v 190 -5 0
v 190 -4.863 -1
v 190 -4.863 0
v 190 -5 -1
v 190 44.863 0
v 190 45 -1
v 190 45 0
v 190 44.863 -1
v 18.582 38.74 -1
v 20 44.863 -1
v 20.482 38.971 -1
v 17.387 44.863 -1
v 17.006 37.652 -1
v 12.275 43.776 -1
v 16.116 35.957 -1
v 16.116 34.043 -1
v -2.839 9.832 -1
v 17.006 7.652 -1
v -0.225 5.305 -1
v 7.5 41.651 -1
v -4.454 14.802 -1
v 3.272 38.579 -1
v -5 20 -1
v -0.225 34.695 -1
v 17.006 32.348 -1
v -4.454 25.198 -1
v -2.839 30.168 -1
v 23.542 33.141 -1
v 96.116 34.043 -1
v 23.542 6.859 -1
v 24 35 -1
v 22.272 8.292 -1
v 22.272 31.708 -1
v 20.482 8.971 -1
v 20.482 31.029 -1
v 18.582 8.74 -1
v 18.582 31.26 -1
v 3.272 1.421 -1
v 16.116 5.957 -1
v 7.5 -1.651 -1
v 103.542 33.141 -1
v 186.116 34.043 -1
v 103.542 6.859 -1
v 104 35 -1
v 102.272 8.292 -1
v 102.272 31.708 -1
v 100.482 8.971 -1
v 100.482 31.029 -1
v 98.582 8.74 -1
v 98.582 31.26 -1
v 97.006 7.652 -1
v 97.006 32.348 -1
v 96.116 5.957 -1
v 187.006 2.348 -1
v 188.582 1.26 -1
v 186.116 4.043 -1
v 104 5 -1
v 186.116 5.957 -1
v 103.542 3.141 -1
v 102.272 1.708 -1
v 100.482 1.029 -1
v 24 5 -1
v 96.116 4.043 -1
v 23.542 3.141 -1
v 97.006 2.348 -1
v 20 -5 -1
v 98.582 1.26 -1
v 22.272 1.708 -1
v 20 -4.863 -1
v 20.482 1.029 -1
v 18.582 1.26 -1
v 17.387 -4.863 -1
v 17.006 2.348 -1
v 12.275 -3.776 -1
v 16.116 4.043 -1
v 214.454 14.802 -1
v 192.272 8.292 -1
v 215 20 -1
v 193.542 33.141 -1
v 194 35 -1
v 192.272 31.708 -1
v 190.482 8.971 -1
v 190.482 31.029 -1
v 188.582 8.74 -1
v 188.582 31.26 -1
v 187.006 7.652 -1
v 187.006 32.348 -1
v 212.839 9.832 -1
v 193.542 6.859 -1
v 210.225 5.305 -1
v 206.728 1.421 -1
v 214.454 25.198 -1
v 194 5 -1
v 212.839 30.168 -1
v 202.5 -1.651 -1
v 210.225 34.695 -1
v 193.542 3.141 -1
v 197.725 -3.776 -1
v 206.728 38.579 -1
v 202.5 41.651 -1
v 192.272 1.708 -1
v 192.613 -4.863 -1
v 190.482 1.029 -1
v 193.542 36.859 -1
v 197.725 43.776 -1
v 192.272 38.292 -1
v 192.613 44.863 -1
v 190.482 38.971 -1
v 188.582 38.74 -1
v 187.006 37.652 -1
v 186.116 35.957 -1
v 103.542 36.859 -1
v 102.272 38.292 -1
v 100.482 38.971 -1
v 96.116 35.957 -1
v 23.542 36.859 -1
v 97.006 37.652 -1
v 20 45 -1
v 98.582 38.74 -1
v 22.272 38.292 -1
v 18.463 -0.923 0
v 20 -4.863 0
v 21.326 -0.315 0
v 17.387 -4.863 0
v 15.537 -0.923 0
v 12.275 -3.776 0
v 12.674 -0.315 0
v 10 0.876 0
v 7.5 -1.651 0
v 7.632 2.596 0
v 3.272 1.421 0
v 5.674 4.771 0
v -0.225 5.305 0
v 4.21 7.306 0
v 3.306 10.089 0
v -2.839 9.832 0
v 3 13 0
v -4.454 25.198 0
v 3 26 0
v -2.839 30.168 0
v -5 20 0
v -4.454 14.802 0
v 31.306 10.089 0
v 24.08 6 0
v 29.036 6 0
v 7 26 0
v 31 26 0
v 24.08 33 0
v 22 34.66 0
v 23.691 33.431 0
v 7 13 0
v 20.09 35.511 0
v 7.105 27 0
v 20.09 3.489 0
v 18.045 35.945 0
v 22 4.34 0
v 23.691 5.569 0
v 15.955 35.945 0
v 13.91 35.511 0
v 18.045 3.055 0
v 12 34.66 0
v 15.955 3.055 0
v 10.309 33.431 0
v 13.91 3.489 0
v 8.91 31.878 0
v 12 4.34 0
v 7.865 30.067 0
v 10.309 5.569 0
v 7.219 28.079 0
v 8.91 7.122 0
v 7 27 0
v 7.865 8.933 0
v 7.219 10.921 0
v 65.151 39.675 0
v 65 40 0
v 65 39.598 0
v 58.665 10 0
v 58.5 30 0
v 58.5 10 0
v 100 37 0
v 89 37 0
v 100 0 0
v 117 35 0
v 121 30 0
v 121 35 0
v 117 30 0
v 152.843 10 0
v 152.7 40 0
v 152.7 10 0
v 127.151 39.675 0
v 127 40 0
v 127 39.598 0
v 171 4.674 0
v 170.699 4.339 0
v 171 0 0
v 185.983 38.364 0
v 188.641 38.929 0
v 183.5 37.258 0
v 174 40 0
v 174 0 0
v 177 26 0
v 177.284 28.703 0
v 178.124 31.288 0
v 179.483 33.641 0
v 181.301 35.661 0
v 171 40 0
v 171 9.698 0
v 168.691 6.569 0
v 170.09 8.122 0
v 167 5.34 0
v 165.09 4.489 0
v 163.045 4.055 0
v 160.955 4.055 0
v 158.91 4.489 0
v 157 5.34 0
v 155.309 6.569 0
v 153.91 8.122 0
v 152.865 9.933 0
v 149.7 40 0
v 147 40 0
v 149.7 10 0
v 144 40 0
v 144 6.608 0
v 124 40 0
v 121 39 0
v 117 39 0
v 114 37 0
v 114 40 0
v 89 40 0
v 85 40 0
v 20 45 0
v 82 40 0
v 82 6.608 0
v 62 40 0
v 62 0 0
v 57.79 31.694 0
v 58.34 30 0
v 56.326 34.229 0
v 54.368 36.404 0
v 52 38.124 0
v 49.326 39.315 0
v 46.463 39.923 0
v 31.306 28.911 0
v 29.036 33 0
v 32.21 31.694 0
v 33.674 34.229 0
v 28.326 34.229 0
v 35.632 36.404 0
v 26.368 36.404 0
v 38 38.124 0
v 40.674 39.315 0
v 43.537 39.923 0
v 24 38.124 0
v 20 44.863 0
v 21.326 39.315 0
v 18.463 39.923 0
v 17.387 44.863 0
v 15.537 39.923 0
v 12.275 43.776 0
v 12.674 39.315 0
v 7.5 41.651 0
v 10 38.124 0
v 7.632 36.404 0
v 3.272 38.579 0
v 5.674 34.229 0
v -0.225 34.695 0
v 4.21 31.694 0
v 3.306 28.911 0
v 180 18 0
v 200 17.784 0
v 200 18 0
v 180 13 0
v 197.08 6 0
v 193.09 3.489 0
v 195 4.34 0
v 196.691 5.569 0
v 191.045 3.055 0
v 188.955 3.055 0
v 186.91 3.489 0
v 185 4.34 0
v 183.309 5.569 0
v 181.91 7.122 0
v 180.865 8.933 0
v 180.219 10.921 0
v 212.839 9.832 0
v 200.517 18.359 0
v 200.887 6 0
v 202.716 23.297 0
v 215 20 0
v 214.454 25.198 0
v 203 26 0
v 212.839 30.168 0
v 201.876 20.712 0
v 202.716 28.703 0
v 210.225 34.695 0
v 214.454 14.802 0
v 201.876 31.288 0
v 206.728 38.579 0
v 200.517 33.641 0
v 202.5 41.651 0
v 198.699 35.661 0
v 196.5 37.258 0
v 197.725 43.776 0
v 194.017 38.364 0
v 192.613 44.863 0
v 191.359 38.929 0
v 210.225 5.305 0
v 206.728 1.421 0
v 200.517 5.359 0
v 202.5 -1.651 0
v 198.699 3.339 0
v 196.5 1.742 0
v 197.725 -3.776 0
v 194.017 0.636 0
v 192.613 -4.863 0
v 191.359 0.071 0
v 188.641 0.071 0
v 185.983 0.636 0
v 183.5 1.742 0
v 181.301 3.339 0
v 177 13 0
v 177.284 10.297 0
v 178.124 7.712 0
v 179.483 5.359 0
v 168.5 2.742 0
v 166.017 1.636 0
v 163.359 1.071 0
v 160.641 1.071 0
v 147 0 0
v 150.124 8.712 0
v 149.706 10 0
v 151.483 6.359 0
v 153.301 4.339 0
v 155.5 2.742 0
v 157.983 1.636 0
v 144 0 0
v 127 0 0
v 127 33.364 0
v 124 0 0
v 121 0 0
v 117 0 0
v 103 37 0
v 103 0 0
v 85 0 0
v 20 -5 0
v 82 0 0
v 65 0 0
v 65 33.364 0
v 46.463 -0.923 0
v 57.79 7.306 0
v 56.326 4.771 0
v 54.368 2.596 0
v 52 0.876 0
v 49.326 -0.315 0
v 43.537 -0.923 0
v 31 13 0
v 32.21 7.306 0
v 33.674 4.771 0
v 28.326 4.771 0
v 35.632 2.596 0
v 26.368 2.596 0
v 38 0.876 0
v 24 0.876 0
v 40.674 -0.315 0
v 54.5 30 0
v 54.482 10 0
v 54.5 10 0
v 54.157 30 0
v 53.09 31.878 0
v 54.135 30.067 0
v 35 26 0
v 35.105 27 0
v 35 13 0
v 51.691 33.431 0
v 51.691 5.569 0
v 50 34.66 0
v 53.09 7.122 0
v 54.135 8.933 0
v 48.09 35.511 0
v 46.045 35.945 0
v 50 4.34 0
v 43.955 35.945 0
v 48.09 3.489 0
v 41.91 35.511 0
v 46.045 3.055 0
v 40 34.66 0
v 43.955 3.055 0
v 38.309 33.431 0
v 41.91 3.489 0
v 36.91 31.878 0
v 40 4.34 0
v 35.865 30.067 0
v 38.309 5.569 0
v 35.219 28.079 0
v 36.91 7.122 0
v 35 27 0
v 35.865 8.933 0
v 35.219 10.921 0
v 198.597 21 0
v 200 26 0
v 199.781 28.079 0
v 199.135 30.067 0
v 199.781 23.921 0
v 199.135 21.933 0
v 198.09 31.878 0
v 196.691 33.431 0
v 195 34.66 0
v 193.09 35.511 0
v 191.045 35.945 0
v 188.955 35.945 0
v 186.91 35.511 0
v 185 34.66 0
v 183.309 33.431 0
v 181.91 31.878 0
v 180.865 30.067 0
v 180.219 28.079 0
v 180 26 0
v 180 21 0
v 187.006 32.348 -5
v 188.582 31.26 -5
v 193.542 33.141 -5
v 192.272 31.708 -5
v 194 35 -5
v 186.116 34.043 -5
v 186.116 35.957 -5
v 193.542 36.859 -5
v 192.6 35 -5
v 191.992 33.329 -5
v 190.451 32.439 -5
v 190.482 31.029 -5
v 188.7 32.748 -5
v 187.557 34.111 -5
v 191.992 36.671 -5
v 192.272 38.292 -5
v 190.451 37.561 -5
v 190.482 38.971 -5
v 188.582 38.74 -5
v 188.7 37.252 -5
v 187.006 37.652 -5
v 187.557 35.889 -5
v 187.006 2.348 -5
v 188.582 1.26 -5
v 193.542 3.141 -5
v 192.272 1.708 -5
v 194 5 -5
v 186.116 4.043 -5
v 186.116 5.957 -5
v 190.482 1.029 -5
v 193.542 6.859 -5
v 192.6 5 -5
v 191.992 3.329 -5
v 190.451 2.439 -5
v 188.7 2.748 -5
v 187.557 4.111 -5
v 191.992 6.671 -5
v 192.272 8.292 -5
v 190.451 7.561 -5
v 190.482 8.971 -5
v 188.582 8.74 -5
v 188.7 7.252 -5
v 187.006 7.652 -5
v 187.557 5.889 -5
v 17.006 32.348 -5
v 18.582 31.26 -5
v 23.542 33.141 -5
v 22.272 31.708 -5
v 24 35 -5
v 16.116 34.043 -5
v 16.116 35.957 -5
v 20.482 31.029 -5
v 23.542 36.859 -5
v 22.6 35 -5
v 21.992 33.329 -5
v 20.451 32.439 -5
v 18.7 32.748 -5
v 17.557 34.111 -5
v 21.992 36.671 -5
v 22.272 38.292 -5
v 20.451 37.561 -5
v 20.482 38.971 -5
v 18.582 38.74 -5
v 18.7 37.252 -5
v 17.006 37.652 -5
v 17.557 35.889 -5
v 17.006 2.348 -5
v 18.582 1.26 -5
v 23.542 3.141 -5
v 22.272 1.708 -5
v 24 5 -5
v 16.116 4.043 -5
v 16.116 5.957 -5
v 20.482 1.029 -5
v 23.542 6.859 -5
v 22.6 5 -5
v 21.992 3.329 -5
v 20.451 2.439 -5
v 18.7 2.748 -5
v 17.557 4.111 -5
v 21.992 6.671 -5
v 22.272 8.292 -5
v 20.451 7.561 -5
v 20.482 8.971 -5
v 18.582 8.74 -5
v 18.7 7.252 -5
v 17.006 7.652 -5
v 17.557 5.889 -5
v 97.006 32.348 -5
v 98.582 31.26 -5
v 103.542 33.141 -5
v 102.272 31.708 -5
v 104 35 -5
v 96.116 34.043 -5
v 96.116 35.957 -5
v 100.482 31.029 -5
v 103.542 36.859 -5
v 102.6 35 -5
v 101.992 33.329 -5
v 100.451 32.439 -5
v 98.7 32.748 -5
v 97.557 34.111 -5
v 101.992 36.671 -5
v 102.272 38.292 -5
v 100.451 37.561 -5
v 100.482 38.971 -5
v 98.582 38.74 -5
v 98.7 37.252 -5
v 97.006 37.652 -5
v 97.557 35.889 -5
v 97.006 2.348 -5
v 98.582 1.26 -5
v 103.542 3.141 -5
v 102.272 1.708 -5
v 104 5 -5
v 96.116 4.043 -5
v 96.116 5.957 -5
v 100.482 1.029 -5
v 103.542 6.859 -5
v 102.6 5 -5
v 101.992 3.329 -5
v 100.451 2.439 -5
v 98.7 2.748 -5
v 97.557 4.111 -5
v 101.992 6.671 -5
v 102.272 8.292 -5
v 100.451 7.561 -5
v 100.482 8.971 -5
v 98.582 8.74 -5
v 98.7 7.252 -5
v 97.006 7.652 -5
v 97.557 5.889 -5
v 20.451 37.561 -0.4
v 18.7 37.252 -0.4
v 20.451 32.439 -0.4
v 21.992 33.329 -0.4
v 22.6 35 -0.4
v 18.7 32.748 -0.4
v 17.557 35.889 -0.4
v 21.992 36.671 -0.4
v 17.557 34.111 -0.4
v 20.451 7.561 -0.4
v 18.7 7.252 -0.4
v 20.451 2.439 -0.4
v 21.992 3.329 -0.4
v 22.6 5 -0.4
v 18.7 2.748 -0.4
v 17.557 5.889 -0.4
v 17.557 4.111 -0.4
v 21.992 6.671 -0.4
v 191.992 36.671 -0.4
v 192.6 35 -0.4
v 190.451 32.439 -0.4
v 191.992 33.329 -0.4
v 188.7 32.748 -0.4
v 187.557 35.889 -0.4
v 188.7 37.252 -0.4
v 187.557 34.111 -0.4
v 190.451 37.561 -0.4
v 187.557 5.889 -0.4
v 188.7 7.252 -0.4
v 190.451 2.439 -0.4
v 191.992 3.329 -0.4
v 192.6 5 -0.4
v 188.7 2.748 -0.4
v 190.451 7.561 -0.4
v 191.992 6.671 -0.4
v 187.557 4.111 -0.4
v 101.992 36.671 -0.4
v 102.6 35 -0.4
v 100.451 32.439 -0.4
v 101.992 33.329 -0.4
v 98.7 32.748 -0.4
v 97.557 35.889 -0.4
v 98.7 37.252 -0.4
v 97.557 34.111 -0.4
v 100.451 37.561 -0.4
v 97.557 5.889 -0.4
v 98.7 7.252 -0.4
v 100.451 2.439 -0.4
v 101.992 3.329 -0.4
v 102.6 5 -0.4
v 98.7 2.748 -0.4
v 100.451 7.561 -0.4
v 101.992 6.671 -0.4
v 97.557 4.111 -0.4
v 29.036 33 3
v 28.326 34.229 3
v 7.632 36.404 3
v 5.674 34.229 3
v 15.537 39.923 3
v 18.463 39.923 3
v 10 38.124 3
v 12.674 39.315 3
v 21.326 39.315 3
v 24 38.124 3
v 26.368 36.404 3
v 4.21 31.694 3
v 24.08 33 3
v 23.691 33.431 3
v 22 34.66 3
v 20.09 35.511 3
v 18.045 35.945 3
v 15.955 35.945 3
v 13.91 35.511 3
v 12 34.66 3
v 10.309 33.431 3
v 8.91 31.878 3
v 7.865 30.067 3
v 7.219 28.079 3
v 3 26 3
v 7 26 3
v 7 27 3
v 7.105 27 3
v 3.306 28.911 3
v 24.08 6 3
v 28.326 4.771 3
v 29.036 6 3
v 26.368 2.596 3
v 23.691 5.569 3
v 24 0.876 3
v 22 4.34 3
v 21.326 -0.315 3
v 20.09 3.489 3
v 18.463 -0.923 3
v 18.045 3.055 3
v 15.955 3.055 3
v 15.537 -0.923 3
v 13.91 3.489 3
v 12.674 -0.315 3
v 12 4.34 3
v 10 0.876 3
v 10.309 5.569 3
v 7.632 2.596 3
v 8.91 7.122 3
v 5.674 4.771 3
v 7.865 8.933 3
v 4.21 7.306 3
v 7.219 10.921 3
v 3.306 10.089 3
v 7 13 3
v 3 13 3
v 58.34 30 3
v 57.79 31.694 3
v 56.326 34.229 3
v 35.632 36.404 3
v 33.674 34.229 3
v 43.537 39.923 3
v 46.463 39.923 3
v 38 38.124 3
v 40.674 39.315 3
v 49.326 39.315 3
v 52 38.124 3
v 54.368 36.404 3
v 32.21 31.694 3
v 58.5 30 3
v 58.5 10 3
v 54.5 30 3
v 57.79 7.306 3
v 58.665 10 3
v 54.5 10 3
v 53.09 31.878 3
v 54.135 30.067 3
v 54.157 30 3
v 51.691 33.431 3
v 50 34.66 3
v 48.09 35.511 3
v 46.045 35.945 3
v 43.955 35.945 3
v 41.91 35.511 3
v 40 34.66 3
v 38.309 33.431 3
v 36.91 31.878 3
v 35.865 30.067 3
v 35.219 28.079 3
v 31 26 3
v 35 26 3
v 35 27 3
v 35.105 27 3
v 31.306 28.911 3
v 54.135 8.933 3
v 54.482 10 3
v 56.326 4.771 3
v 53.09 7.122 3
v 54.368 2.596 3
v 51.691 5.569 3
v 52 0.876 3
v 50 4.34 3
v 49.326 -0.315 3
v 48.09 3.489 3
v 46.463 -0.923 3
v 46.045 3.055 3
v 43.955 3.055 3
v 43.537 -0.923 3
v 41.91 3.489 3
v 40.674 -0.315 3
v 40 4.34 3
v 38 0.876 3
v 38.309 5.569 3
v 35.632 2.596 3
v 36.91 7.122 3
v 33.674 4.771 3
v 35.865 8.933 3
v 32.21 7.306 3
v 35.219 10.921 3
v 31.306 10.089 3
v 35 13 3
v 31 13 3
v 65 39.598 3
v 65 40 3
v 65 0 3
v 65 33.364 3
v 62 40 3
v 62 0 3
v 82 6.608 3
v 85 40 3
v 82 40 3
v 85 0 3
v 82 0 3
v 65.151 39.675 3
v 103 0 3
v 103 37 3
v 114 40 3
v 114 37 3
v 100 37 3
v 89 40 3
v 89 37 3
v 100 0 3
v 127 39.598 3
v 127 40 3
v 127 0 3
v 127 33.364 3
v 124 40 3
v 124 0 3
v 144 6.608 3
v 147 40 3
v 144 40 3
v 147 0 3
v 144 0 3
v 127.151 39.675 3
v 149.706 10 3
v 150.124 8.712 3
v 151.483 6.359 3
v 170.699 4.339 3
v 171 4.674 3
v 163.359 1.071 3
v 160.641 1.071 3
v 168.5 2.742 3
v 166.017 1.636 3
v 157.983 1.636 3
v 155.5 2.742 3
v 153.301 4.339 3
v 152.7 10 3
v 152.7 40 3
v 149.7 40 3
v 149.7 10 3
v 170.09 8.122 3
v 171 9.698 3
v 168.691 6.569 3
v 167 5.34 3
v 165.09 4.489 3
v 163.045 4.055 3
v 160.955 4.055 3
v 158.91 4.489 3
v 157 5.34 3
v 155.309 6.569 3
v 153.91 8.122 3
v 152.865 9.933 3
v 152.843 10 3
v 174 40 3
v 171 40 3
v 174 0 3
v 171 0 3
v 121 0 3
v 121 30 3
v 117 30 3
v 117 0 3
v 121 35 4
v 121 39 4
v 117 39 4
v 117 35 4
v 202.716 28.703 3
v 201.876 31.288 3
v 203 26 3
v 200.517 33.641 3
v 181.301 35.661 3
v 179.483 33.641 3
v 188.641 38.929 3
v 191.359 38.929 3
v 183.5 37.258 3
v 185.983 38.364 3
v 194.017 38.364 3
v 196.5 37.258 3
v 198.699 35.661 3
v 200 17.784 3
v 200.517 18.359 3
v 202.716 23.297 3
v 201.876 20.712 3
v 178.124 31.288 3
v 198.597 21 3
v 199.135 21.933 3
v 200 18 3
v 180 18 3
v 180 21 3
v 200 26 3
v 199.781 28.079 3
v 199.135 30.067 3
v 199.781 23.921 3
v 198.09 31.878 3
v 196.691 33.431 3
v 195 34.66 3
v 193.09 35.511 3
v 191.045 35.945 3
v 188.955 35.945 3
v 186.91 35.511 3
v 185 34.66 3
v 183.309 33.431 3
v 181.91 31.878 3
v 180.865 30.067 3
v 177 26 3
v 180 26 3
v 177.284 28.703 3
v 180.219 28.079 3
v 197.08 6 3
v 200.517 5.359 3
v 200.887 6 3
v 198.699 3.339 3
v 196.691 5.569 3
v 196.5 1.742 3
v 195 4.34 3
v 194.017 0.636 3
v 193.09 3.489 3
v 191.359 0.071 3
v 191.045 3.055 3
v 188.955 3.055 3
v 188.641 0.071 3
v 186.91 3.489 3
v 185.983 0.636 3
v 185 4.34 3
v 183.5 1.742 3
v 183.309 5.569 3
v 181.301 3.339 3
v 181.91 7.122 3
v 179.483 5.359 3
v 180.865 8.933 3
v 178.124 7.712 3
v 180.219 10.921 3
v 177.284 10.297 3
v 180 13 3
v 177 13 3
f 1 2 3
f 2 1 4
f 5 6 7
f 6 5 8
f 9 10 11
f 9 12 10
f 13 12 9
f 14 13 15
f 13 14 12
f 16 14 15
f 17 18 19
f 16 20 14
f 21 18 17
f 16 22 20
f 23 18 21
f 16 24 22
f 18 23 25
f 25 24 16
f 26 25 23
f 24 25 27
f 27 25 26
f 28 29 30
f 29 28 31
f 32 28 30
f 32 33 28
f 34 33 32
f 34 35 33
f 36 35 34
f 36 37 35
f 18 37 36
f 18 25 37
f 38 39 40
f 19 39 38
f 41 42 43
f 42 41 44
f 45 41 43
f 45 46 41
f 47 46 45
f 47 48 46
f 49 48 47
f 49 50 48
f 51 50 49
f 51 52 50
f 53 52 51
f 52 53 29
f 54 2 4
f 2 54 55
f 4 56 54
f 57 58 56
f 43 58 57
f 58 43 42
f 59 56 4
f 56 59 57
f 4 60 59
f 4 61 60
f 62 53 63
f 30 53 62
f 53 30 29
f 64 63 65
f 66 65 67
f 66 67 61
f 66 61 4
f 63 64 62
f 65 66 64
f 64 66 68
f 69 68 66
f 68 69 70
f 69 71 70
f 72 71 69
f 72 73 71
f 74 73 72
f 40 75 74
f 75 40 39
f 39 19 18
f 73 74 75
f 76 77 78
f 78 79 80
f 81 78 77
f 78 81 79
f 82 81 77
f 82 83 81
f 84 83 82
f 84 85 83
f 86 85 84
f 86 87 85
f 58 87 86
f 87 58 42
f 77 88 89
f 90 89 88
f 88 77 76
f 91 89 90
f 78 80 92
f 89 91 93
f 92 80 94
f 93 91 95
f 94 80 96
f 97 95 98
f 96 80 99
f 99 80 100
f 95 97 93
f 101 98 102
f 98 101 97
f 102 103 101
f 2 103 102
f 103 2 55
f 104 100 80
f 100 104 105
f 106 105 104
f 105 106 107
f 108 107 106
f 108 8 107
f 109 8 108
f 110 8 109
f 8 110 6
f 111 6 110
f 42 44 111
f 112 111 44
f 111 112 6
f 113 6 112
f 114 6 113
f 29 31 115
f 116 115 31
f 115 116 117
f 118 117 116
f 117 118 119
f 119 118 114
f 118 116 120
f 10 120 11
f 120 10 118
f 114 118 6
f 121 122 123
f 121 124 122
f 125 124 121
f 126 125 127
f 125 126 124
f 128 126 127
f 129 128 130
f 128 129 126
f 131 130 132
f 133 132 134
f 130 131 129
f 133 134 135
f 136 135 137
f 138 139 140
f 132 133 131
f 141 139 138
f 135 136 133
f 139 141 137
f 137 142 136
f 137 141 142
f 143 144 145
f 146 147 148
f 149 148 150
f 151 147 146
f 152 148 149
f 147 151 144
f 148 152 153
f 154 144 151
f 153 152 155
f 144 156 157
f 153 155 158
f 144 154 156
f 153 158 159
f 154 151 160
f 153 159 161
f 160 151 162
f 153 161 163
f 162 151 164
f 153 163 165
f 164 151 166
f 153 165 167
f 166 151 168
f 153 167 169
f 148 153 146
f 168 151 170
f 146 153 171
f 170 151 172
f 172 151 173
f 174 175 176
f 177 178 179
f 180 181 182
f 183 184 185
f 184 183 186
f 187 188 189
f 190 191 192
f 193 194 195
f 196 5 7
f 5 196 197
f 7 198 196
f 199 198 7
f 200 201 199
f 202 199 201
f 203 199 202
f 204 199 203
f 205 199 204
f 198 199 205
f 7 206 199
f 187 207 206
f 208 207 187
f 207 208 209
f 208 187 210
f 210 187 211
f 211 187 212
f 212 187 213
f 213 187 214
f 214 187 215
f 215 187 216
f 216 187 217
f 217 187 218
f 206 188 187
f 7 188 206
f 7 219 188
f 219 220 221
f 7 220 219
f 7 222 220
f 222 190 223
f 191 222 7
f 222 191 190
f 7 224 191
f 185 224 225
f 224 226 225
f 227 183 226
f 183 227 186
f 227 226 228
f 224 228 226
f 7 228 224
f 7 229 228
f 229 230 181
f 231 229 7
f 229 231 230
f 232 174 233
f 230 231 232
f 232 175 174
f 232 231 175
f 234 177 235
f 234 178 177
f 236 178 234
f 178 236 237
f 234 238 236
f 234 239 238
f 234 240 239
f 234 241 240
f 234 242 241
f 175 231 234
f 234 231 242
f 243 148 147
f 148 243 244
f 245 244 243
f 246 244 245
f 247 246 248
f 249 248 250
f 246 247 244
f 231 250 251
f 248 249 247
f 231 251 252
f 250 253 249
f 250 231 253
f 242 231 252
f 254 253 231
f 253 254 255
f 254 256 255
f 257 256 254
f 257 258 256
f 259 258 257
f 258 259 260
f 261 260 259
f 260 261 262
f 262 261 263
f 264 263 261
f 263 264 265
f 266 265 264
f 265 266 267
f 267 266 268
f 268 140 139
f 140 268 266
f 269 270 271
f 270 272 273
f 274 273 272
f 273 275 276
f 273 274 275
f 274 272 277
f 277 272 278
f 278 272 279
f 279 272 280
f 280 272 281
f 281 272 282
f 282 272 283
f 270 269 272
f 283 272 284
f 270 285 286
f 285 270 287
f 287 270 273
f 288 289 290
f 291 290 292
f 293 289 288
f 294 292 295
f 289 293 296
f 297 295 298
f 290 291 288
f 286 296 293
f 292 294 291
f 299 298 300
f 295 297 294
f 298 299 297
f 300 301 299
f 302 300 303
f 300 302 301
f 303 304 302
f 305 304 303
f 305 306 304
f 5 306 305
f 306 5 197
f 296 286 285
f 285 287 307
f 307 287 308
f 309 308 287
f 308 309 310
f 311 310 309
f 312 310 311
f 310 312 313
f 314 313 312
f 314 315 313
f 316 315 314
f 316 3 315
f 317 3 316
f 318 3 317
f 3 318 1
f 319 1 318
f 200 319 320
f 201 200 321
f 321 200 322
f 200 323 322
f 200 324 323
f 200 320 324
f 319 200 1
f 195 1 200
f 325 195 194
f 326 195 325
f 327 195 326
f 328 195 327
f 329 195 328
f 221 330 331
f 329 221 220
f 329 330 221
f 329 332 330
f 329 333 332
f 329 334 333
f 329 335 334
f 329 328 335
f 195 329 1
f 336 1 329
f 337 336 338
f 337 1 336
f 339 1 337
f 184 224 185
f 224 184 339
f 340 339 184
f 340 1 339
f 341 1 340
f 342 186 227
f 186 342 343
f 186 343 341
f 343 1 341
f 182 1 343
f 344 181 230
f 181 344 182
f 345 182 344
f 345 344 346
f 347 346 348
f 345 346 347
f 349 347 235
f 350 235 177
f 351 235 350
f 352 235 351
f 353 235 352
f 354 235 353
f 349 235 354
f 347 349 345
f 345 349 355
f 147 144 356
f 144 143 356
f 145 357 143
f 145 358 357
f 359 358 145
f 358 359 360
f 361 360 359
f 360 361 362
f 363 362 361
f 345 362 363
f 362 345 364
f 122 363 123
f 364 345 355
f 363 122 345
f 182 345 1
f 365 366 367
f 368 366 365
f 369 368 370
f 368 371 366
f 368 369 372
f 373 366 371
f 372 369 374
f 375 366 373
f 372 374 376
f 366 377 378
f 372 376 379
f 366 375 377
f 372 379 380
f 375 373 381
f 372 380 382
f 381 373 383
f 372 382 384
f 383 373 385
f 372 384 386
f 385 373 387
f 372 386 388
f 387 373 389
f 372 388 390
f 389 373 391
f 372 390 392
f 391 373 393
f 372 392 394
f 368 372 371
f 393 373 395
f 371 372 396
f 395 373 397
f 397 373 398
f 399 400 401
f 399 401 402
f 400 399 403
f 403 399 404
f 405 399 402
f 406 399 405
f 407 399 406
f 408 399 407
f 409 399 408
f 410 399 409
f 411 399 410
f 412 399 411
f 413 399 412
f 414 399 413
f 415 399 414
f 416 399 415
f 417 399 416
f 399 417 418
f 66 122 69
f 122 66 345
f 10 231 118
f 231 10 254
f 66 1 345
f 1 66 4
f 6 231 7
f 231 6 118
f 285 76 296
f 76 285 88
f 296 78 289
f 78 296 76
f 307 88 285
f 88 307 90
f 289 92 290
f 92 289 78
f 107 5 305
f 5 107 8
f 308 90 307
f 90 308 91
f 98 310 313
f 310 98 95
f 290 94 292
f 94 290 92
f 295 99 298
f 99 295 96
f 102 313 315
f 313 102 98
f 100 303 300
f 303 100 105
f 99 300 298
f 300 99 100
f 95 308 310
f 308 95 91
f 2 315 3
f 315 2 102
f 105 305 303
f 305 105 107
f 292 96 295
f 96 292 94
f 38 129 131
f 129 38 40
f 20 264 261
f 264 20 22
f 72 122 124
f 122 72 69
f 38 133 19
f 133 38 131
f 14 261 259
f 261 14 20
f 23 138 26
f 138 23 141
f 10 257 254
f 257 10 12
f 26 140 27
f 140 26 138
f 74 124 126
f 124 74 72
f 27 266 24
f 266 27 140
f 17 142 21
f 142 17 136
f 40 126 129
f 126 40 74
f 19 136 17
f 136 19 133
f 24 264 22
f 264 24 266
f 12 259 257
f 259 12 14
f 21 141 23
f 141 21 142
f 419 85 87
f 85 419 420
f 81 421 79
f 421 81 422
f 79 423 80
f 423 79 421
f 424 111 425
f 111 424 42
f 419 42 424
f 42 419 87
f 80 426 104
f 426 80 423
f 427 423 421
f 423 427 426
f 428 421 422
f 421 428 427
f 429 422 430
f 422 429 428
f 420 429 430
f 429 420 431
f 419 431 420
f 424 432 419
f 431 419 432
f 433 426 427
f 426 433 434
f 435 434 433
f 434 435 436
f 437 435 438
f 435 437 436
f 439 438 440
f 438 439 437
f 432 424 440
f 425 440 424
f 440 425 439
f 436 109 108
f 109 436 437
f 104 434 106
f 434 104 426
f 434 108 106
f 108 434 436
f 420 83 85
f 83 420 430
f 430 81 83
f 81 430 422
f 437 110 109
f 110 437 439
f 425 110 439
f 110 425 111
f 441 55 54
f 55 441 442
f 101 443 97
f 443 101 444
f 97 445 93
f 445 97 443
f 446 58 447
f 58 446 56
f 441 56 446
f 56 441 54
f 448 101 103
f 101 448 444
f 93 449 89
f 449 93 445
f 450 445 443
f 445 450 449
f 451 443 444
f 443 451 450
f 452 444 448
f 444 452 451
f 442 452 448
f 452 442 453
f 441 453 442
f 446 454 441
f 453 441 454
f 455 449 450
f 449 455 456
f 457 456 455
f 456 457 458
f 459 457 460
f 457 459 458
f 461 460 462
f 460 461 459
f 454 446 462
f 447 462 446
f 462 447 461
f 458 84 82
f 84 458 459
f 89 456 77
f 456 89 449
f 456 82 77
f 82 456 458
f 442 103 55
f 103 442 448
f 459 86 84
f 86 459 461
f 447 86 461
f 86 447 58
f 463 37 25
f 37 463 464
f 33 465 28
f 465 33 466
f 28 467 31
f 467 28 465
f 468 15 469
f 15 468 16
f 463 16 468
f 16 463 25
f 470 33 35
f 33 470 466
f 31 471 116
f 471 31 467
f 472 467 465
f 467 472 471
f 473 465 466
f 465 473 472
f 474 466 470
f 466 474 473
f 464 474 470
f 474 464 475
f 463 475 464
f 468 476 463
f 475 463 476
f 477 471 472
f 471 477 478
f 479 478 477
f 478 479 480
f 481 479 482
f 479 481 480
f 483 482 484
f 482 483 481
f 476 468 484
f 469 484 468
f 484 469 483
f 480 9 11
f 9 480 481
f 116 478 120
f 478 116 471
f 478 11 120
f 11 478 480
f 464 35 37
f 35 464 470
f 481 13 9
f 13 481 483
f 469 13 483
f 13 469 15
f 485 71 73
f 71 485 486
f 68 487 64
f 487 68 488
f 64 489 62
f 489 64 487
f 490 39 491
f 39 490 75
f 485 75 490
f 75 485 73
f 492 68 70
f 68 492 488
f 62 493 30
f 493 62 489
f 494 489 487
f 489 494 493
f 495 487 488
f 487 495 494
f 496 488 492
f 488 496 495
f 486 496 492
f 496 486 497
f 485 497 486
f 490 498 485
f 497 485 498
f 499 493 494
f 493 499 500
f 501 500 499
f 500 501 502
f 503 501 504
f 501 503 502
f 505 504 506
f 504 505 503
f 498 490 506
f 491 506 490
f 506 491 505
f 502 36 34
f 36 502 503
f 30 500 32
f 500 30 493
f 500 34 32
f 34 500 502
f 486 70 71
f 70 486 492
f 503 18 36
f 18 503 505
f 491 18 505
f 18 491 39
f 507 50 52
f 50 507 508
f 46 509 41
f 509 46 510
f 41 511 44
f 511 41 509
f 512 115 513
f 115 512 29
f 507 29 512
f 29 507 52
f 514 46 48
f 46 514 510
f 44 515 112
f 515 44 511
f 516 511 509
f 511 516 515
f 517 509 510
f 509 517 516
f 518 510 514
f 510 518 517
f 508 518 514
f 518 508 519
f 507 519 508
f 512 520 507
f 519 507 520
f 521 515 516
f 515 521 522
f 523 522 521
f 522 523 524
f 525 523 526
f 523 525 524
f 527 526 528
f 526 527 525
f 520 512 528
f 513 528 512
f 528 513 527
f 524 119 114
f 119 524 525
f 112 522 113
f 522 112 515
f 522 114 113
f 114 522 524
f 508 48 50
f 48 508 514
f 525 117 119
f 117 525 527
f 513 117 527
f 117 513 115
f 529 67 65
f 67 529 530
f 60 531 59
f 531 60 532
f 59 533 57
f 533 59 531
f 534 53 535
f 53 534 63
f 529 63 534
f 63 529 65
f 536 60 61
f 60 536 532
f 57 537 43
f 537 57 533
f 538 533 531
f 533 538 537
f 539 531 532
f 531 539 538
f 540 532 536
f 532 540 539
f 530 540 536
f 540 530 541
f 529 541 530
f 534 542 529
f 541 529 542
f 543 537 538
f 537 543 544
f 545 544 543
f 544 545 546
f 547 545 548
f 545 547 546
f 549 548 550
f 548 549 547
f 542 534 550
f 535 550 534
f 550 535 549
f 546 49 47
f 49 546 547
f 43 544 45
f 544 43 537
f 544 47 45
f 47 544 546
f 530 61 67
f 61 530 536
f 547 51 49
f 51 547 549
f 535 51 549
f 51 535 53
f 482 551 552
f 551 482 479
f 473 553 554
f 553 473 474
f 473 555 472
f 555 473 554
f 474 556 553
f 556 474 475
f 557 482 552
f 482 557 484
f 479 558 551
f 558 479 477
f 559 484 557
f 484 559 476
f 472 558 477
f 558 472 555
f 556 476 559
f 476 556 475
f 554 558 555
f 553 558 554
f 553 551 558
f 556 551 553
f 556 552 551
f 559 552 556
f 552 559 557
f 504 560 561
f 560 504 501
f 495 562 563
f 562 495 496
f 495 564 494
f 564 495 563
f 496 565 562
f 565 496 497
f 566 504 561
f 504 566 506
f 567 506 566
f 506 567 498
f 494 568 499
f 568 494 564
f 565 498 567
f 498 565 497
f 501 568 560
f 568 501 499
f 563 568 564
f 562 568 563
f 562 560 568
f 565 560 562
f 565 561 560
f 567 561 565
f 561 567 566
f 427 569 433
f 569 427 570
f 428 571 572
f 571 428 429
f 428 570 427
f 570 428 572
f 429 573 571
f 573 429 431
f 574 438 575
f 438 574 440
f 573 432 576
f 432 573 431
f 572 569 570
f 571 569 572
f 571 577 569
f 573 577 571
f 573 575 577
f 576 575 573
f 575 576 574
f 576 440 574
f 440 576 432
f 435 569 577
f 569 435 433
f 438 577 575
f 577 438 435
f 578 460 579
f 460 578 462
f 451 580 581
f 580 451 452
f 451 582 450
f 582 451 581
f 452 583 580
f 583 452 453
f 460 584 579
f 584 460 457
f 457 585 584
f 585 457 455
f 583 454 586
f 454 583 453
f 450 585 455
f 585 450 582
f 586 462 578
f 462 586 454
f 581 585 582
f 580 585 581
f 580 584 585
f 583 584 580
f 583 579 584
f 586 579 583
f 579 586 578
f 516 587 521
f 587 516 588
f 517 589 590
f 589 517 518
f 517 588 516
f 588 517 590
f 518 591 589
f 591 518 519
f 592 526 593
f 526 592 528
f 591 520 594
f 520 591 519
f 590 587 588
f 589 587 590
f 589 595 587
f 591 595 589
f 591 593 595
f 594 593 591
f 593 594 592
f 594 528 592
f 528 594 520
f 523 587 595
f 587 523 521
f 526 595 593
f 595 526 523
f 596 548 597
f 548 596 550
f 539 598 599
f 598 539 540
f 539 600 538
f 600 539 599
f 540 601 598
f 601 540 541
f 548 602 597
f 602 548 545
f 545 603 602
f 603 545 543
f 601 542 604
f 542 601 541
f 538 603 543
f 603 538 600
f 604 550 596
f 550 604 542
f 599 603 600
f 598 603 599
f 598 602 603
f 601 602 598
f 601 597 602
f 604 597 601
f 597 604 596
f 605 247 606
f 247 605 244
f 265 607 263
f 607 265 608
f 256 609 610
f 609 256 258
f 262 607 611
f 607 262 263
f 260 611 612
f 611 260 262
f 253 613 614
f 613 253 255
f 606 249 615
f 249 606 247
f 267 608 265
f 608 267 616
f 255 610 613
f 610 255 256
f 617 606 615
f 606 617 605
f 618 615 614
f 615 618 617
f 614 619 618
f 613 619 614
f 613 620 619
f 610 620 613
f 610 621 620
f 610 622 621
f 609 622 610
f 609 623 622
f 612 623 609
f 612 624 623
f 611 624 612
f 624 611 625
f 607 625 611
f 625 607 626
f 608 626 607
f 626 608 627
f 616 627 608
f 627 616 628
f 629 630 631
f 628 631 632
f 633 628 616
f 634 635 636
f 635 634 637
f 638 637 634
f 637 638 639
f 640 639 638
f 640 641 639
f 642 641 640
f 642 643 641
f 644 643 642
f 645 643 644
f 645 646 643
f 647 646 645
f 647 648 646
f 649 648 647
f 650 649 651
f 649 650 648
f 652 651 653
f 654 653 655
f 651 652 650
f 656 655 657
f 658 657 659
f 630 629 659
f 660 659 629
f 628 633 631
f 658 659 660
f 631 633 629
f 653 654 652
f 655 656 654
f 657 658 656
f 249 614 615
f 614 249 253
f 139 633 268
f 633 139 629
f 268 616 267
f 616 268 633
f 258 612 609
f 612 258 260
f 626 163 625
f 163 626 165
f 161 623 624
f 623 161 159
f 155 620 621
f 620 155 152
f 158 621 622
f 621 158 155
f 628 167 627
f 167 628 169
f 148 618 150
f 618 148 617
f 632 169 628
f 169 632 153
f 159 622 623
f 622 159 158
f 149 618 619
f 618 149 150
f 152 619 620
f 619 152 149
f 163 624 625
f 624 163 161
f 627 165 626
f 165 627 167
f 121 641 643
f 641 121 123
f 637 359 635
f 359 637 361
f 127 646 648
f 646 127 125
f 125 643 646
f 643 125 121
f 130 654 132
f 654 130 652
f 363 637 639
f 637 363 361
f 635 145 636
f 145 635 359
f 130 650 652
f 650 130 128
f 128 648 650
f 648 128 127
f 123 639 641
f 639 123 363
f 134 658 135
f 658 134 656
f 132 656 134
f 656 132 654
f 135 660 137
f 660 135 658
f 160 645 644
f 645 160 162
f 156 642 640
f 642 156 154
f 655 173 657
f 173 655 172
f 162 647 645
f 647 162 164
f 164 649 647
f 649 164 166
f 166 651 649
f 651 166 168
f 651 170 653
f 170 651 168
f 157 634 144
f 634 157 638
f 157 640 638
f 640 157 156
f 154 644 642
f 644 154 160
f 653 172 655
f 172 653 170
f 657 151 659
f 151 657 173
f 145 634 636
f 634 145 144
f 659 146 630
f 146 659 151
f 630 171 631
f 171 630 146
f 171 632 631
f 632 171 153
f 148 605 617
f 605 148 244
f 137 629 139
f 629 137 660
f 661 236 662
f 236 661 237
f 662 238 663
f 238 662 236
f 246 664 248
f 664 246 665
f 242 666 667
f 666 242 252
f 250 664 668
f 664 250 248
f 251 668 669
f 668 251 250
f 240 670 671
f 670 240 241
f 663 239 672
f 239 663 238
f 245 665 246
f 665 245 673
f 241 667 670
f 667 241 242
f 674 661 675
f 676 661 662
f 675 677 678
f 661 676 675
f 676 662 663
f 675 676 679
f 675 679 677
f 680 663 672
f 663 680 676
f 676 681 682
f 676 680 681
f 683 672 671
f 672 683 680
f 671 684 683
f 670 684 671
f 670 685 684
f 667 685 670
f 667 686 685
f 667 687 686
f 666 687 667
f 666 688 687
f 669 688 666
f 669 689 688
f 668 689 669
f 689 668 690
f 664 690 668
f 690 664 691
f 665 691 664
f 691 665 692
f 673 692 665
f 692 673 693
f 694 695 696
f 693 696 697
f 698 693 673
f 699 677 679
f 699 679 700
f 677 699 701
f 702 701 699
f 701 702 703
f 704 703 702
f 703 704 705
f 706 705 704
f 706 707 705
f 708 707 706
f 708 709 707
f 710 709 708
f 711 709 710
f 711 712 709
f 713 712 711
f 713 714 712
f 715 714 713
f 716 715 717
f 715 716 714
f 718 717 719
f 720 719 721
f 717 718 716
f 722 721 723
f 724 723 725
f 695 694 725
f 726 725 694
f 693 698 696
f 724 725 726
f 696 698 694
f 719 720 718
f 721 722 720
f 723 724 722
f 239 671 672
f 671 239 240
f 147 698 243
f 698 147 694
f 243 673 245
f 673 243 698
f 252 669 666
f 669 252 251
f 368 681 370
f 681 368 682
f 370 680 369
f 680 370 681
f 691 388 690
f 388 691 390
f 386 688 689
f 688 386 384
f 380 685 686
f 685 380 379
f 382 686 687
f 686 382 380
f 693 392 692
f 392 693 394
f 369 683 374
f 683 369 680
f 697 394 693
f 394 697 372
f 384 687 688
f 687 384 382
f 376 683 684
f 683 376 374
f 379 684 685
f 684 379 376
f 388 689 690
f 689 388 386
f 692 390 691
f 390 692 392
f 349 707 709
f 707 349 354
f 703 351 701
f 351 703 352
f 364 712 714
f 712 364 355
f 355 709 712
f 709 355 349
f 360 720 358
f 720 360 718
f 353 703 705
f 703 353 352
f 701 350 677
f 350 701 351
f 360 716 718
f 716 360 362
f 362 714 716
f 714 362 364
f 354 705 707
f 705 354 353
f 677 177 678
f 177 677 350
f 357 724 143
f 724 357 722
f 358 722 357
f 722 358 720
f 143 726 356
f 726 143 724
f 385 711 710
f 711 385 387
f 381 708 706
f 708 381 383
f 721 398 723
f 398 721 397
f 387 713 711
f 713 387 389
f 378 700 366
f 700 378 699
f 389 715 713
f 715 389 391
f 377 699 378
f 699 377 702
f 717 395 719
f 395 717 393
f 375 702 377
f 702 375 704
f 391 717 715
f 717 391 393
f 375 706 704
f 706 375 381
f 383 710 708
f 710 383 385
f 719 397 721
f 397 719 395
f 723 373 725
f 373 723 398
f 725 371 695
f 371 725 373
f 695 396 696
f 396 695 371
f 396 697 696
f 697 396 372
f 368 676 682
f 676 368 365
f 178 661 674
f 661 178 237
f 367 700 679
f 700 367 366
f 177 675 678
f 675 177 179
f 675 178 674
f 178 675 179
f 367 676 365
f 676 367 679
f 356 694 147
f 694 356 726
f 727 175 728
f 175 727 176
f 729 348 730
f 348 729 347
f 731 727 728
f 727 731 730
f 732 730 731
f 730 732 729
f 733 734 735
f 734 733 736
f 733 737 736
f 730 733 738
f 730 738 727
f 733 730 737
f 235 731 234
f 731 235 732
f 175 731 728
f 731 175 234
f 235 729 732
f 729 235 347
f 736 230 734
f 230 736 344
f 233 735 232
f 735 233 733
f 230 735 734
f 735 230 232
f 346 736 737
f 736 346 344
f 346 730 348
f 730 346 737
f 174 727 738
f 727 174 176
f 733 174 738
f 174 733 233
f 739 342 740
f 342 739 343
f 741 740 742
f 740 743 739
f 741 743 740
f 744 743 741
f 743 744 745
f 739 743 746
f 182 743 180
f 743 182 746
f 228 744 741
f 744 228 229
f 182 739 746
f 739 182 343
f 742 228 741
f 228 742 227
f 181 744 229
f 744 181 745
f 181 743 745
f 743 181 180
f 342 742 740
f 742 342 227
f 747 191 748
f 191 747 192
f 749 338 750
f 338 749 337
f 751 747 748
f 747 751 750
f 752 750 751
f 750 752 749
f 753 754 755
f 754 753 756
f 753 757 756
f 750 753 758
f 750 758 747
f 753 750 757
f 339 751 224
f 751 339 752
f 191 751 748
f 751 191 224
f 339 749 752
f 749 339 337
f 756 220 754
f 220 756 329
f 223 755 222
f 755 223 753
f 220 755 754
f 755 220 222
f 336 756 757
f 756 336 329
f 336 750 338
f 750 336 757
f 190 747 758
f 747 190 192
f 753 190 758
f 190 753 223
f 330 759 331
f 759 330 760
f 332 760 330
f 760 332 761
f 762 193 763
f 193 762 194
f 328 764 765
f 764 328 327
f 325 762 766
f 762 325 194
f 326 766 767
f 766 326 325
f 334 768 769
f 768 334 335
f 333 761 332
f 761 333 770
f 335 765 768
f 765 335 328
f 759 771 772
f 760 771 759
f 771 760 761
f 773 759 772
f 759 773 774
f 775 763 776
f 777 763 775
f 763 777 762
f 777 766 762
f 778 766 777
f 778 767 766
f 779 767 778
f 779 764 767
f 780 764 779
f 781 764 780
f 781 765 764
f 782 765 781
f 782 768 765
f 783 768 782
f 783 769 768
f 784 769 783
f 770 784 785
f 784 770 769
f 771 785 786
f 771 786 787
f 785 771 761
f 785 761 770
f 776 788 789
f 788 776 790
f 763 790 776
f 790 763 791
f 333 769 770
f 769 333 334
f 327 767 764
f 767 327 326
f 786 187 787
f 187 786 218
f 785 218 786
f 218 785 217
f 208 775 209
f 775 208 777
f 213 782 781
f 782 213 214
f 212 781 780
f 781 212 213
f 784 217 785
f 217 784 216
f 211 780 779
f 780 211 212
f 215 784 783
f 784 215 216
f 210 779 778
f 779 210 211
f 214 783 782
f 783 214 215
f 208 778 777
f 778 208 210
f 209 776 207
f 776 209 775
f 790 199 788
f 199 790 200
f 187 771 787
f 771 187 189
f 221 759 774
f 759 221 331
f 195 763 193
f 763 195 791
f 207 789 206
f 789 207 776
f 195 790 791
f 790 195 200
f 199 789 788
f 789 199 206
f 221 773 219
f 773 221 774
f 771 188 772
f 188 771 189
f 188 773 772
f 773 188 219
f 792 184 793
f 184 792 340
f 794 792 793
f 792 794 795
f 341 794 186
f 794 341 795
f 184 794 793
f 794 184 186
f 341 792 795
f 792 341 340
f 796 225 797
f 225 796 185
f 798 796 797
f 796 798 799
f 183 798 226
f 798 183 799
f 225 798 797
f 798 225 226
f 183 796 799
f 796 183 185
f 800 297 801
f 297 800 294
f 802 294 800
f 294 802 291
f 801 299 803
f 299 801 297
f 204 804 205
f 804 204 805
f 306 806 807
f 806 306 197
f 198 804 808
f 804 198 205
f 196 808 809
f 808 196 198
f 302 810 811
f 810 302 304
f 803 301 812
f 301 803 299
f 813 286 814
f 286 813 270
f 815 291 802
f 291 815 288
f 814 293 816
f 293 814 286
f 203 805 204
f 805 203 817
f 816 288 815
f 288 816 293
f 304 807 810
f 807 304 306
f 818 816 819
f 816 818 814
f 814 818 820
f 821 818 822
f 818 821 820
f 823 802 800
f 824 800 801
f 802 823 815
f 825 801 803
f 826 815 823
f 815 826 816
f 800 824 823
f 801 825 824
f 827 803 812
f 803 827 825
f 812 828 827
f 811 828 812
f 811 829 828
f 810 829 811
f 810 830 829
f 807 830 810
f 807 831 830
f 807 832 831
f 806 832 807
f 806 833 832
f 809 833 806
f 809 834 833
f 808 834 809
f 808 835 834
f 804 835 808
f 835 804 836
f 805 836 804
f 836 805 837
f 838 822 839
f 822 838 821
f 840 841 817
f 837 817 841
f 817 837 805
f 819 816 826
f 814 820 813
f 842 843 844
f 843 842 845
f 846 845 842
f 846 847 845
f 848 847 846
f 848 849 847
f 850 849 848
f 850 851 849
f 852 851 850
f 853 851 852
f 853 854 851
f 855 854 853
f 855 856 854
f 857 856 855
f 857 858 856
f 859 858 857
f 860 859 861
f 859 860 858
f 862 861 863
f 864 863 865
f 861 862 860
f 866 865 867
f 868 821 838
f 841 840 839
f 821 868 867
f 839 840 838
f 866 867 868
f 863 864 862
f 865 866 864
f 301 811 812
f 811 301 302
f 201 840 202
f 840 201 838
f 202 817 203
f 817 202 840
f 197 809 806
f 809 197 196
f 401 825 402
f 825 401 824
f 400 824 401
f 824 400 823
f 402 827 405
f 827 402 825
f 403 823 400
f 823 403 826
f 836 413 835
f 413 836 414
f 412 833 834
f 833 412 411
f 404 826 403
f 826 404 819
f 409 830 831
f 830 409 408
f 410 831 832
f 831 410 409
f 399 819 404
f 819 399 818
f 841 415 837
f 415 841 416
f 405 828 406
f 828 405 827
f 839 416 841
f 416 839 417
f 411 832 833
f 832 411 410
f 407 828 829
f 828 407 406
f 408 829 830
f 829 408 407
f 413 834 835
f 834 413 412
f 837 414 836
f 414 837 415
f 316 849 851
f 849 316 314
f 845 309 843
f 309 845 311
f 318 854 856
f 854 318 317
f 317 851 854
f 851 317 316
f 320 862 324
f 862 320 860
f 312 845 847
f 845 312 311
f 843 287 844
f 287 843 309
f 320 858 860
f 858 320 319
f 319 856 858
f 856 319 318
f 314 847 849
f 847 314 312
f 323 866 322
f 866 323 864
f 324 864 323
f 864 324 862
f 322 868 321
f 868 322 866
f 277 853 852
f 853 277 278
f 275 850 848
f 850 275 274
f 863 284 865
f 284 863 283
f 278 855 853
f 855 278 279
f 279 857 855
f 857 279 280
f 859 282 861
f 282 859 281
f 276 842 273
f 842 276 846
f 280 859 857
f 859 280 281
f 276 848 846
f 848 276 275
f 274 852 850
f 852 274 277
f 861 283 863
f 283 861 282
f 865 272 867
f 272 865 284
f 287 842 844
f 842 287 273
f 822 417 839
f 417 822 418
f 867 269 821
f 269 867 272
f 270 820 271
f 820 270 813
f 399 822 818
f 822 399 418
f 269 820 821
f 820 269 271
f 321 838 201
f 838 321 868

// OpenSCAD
//основа						
 union(){
	rotate([180,0,0]) translate([20,-45,0])
 difference(){  
  union(){  
	cube([170,50,1]);
	translate([170,25,0]) cylinder(1,25,25);
    translate([0,25,0]) cylinder(1,25,25);
  	translate([170,10,0]) cylinder(5,4,4);
	translate([170,40,0]) cylinder(5,4,4);
	translate([0,10,0]) cylinder(5,4,4);
	translate([0,40,0]) cylinder(5,4,4);
	translate([80,10,0]) cylinder(5,4,4);
	translate([80,40,0]) cylinder(5,4,4);
}
	#translate([0,10,0.4]) cylinder(5,2.6,2.6);
	#translate([0,40,0.4]) cylinder(5,2.6,2.6);
	#translate([170,10,0.4]) cylinder(5,2.6,2.6);
	#translate([170,40,0.4]) cylinder(5,2.6,2.6);
	#translate([80,10,0.4]) cylinder(5,2.6,2.6);
	#translate([80,40,0.4]) cylinder(5,2.6,2.6);
}


 translate([20,0,0]) //Letters

 union(){
 union(){
//C
	translate([-43,0,0])
 union(){
	translate([26,13,0]) cube([4,13,3]);

 difference(){
 union(){
	
  difference(){
  translate([40,26,0]) cylinder(3,14,14);
  translate([40,26,-1]) cylinder(5,10,10);
  translate([33,12,-1]) cube([20,20,5]);

}

 difference(){
  translate([40,13,0]) cylinder(3,14,14);
  translate([40,13,-1]) cylinder(5,10,10);
  translate([32,15,-1]) cube([19,13,5]);
  translate([40,6,-1]) cube(20);
}
}
  translate([30,13,-1]) cube([5,14,5]);
  translate([42,13,-1]) cube(20);
}
}

//О

	translate([-15,0,0])
 union(){
	translate([49.5,10,0]) cube([4,20,3]);
	translate([26,13,0]) cube([4,13,3]);
 difference(){
 union(){
	
  difference(){
	translate([40,26,0]) cylinder(3,14,14);
	translate([40,26,-1]) cylinder(5,10,10);
	translate([33,10,-1]) cube([20,10,5]);

}

 difference(){
	translate([40,13,0]) cylinder(3,14,14);
	translate([40,13,-1]) cylinder(5,10,10);
	translate([32,17,-1]) cube([19,10,5]);
	translate([40,17,-1]) cube(20);
}
}
  translate([30,13,-1]) cube([5,14,5]);
  translate([42,10,-1]) cube(20);
}
}
}

// буква n
	translate([42,0,0])
 union(){
	cube([3,40,3]);
	translate([20,0,0,]) cube([3,40,3]);
	translate([20,0,0]) rotate([0,0,27]) cube([3,43,3]);
}

	translate([10,0,0])
 union(){
//T
	translate([70,0,0])
 union(){ 
	cube([3,40,3]);
 	translate([-11,37,0]) cube([25,3,3]);
}

//I
  translate([87,0,0]) cube([4,30,3]);
  translate([87,35,0]) cube(4);

//N
	translate([94,0,0])
 union(){
 	cube([3,40,3]);
 	translate([20,0,0,]) cube([3,40,3]);
 	translate([20,0,0]) rotate([0,0,27]) cube([3,43,3]);
}

//U
 	translate([144,40,0]) rotate([180,180,0])  
 union(){
	cube([3,40,3]);
 difference(){  
	translate([12,26,0]) cylinder(3,13,13);
  	translate([12,26,-1]) cylinder(5,10,10);
  	translate([0,10,-1]) cube([30,20,5]);
	translate([-3,0,-1]) cube([3,40,5]);

}
	translate([21.3,0,0]) cube([3,30,3]);
}
}

//e
	translate([130,0,0])
 union(){
	translate([28,18,0]) cube([22,3,3]);
	translate([27,13,0]) cube([3,13,3]);
 difference(){
	union(){
	
  difference(){
	translate([40,26,0]) cylinder(3,13,13);
	translate([40,26,-1]) cylinder(5,10,10);
  	translate([32,12,-1]) cube([16,10,5]);

}

 difference(){
  	translate([40,13,0]) cylinder(3,13,13);
  	translate([40,13,-1]) cylinder(5,10,10);
  	translate([32,15,-1]) cube([19,13,5]);
  	translate([40,6,-1]) cube(20);
}
}
	translate([30,13,-1]) cube([3,13,5]);
	translate([40,10,-1]) cube(10);
}
}
}
}
